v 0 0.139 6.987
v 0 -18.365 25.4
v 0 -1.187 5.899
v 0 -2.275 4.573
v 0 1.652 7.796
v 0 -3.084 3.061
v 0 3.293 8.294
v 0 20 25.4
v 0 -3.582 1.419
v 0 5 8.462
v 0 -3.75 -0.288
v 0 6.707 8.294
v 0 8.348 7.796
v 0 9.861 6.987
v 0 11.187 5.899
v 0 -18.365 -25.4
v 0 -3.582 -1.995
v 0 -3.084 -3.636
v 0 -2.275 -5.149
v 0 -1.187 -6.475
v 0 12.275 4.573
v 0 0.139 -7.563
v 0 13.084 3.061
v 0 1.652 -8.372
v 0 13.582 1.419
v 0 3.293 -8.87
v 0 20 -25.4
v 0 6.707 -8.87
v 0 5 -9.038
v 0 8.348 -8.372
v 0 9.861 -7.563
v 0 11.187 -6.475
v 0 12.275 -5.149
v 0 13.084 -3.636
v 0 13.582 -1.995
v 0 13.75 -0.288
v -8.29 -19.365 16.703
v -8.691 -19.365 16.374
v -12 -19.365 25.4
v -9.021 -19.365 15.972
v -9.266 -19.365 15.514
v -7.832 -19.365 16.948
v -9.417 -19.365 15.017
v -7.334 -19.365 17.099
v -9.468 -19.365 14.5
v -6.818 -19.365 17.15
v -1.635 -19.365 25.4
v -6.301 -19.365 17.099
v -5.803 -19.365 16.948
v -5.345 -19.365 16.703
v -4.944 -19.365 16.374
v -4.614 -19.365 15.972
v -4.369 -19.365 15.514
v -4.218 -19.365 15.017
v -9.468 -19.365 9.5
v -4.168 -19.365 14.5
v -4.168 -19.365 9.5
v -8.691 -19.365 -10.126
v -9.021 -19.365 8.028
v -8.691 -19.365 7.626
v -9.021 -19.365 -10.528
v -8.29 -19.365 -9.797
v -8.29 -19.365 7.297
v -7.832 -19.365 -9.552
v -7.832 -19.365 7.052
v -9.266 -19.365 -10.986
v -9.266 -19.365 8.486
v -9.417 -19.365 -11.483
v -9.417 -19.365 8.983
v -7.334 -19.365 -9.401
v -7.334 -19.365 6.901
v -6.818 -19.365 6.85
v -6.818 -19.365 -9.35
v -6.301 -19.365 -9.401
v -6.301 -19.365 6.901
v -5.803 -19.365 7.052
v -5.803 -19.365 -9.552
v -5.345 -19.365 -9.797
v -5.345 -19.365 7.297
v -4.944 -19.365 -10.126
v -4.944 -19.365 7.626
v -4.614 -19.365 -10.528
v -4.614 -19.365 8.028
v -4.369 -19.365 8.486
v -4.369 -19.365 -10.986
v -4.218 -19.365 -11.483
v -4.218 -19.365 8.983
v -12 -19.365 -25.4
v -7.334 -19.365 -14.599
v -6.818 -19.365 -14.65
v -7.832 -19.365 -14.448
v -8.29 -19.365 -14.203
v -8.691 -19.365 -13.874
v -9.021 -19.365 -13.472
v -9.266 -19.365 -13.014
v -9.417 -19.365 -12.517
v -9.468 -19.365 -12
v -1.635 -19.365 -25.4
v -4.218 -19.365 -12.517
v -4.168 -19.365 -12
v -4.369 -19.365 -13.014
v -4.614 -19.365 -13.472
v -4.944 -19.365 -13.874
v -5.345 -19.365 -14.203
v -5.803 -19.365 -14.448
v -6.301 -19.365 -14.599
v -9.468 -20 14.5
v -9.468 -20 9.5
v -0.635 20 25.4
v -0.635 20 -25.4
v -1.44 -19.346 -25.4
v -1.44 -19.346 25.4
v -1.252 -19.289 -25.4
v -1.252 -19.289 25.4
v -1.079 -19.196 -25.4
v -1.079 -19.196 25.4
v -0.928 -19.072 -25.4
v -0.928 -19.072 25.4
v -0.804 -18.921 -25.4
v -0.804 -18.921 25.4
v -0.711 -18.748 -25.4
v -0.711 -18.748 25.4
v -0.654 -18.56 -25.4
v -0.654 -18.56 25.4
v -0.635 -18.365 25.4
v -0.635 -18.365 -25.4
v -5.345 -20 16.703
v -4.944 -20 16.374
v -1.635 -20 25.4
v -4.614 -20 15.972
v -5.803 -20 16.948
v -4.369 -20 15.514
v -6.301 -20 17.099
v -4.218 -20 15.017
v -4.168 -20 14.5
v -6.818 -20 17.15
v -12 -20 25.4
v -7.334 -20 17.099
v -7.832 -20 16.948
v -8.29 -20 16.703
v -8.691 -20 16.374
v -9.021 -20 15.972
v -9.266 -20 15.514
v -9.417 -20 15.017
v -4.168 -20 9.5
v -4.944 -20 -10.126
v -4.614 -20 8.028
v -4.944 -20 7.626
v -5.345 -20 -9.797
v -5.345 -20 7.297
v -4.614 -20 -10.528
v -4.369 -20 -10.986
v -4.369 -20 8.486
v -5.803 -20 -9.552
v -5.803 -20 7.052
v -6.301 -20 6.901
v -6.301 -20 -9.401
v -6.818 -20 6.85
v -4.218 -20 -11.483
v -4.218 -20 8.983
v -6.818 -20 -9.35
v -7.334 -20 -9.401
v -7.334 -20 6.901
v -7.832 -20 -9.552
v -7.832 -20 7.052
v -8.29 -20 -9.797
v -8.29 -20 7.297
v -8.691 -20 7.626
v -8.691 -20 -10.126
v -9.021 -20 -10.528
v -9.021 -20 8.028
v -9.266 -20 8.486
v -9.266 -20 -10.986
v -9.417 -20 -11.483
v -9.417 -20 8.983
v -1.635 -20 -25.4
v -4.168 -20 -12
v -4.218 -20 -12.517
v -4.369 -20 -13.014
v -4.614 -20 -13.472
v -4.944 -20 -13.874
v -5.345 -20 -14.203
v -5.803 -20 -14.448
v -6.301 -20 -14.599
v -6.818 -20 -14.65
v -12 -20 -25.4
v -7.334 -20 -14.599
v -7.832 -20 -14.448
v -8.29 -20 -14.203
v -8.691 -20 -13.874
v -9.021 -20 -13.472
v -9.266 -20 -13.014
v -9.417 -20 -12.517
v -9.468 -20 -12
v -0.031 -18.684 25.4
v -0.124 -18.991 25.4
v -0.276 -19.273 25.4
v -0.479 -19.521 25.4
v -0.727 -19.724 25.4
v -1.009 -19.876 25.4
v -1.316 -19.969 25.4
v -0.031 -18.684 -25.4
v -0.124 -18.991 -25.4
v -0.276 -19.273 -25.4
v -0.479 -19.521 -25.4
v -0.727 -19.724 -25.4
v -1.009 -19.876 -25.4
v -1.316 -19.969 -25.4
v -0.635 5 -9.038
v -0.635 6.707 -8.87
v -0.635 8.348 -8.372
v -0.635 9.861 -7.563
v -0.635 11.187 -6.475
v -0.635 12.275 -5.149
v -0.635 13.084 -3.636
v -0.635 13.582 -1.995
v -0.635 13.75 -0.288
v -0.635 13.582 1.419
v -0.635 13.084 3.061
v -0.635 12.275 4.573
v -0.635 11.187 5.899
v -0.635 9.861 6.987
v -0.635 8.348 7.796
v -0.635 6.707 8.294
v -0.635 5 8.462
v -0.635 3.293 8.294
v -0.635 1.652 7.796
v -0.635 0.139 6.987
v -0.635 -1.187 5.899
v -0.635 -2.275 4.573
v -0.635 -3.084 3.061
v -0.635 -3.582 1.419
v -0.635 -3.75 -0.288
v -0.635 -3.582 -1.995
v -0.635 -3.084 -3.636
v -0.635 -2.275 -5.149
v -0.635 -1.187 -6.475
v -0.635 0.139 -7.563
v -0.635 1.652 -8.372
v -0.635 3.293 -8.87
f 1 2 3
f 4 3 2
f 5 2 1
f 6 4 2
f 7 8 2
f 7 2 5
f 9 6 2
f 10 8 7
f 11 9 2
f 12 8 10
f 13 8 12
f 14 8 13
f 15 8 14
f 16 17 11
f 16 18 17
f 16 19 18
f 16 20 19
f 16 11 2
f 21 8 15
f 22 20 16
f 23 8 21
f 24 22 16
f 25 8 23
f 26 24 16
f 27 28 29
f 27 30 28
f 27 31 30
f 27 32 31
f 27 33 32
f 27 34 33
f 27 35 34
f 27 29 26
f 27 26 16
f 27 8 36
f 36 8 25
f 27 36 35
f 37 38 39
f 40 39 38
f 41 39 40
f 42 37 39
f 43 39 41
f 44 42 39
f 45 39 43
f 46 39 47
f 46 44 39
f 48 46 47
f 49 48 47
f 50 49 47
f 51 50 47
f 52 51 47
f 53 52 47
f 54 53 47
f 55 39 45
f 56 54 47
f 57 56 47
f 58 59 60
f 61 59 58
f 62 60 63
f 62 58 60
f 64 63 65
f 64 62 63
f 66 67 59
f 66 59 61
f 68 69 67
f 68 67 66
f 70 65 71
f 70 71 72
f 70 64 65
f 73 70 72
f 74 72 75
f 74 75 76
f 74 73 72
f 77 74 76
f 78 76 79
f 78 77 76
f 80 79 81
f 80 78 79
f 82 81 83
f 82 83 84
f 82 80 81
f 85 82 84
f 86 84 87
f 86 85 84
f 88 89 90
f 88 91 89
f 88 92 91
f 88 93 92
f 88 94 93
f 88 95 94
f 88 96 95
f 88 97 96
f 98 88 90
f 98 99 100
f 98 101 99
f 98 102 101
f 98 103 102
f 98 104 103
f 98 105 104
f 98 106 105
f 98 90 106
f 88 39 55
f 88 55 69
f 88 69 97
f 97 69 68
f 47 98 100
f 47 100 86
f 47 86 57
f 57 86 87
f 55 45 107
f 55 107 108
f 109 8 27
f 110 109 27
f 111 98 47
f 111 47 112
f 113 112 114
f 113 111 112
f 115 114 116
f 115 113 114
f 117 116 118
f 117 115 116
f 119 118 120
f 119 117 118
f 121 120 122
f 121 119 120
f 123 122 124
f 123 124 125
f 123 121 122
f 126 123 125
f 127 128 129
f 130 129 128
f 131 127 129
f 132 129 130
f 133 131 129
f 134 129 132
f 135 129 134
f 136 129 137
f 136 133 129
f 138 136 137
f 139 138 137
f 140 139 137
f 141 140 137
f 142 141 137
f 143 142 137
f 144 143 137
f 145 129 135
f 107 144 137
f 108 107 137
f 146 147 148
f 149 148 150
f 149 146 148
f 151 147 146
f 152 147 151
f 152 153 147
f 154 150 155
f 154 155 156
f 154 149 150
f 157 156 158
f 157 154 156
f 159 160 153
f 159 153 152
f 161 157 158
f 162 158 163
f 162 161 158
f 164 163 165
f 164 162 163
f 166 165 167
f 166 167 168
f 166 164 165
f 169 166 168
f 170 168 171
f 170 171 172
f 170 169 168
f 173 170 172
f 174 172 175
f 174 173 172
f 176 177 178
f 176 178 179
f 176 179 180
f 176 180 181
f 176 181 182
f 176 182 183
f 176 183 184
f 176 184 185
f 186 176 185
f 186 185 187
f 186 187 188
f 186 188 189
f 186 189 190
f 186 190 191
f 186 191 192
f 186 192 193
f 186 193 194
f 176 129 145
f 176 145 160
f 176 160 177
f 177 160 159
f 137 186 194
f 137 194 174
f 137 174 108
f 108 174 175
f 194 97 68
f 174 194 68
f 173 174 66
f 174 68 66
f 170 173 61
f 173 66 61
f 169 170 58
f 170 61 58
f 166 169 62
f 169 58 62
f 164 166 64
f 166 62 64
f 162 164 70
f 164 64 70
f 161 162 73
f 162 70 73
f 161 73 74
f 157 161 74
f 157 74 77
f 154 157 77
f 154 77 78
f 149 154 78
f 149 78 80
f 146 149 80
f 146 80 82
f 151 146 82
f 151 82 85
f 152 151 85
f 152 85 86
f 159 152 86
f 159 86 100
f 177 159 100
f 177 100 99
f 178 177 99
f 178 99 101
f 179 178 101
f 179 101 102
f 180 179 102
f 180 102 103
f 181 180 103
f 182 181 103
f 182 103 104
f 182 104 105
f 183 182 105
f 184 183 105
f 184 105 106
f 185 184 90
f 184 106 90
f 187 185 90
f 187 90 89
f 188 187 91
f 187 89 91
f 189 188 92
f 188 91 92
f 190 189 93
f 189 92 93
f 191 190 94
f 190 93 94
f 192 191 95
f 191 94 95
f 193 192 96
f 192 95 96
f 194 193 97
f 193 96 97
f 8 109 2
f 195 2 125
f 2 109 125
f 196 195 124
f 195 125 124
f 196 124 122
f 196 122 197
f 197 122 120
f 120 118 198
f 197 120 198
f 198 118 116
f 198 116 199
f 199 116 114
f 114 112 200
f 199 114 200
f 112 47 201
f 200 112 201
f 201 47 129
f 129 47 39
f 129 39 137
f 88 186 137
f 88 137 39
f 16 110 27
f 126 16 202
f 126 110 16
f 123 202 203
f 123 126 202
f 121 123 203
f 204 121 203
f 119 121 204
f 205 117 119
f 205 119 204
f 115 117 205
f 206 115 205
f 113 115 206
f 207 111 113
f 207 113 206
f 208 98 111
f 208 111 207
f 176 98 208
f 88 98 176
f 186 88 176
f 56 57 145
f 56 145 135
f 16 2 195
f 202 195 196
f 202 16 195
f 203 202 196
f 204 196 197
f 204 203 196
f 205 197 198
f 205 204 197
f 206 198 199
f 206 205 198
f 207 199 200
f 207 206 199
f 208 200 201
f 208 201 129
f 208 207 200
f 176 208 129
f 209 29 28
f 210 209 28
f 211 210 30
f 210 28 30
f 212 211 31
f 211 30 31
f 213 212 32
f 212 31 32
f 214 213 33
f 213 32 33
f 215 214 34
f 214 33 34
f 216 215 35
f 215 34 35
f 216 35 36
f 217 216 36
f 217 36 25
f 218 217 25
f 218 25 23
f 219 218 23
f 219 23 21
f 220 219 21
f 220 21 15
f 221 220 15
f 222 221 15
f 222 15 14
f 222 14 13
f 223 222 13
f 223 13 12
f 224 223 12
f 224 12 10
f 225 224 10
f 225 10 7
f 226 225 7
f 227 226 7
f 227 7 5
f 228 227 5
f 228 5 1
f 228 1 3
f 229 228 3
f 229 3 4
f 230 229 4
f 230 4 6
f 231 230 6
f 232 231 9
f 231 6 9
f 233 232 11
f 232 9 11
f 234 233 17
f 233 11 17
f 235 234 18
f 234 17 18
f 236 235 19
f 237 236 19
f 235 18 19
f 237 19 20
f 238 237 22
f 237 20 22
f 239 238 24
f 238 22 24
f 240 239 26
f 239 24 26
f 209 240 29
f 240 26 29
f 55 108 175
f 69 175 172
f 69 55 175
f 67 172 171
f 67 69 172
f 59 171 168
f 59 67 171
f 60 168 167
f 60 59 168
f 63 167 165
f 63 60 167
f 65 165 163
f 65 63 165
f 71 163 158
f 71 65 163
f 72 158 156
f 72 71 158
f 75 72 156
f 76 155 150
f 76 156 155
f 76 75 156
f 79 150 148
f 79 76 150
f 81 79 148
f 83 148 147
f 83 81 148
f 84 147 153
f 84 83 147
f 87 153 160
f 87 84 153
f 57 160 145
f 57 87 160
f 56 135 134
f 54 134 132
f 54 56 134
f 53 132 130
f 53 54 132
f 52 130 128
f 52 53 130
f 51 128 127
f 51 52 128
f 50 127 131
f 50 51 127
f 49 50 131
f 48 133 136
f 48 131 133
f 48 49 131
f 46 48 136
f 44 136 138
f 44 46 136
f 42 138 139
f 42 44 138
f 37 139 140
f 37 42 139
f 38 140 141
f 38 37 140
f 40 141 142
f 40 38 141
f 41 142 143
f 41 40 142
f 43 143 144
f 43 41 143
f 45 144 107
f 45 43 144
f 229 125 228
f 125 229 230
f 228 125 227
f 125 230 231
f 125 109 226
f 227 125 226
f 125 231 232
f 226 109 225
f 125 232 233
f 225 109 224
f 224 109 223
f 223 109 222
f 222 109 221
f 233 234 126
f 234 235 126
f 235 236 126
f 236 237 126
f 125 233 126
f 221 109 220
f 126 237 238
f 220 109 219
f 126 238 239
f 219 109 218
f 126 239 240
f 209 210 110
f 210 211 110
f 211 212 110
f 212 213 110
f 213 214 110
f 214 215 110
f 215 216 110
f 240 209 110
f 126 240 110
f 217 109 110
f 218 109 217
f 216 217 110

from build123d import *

# Parameters (mm, degrees)
SKETCH1_W                    = 50.8
SKETCH1_H                    = 40
BASE_FLANGE1_DEPTH           = 0.635
EDGE_FLANGE1_STRIP_W         = 4.54
EDGE_FLANGE1_STRIP_H         = 0.635
EDGE_FLANGE1_STRIP_CUT_DEPTH = 50.8
EDGE_FLANGE1_DEPTH           = 50.8
SKETCH9_R                    = 8.75
CUT_EXTRUDE1_DEPTH           = 35.48419928
SKETCH10_R                   = 2.65
CUT_EXTRUDE2_DEPTH           = 49.360761212


# Sheet-metal steps are written as plain solids
with BuildPart() as part:
    # Sketch1 → Base-Flange1 (new body)
    with BuildSketch(Plane(origin=(0, 0, 0), x_dir=(0, 0, -1), z_dir=(1, 0, 0))):
        Rectangle(SKETCH1_W, SKETCH1_H)
    extrude(amount=-BASE_FLANGE1_DEPTH)

    # Edge-Flange1 strip (across the edge) → Edge-Flange1 strip cut (cut)
    with BuildSketch(Plane(origin=(-0.635, -20, -25.4), x_dir=(0, 1, 0), z_dir=(0, 0, 1))):
        with Locations((-0.635, -0.3175)):
            Rectangle(EDGE_FLANGE1_STRIP_W, EDGE_FLANGE1_STRIP_H)
    extrude(amount=EDGE_FLANGE1_STRIP_CUT_DEPTH, mode=Mode.SUBTRACT)

    # Edge-Flange1 section (across the edge) → Edge-Flange1 (add)
    with BuildSketch(Plane(origin=(-0.635, -20, -25.4), x_dir=(0, 1, 0), z_dir=(0, 0, 1))):
        with BuildLine():
            Line((0, 1), (0, 11.365))
            Line((0, 11.365), (0.635, 11.365))
            Line((0.635, 11.365), (0.635, 1))
            ThreePointArc((0.635, 1), (0.927893219, 0.292893219), (1.635, 0))
            Line((1.635, 0), (1.635, -0.635))
            ThreePointArc((1.635, -0.635), (0.478880413, -0.156119587), (0, 1))
        make_face()
    extrude(amount=EDGE_FLANGE1_DEPTH)

    # Sketch9 → Cut-Extrude1 (cut, through all)
    with BuildSketch(Plane(origin=(0, 0, 0), x_dir=(0, 0, -1), z_dir=(1, 0, 0))):
        with Locations((0.287892683, 5)):
            Circle(SKETCH9_R)
    extrude(amount=-CUT_EXTRUDE1_DEPTH, mode=Mode.SUBTRACT)

    # Sketch10 → Cut-Extrude2 (cut, through all)
    with BuildSketch(Plane(origin=(0, -19.365, 0), x_dir=(1, 0, 0), z_dir=(0, 1, 0))):
        with Locations(Location((-6.8175, 12, 0), (0, 0, 180))):
            Circle(SKETCH10_R)
        with BuildLine():
            Line((-4.1675, -9.5), (-4.1675, -14.5))
            ThreePointArc((-4.1675, -14.5), (-6.8175, -17.15), (-9.4675, -14.5))
            Line((-9.4675, -14.5), (-9.4675, -9.5))
            ThreePointArc((-9.4675, -9.5), (-6.8175, -6.85), (-4.1675, -9.5))
        make_face()
    extrude(amount=-CUT_EXTRUDE2_DEPTH, mode=Mode.SUBTRACT)


solid = part.part
